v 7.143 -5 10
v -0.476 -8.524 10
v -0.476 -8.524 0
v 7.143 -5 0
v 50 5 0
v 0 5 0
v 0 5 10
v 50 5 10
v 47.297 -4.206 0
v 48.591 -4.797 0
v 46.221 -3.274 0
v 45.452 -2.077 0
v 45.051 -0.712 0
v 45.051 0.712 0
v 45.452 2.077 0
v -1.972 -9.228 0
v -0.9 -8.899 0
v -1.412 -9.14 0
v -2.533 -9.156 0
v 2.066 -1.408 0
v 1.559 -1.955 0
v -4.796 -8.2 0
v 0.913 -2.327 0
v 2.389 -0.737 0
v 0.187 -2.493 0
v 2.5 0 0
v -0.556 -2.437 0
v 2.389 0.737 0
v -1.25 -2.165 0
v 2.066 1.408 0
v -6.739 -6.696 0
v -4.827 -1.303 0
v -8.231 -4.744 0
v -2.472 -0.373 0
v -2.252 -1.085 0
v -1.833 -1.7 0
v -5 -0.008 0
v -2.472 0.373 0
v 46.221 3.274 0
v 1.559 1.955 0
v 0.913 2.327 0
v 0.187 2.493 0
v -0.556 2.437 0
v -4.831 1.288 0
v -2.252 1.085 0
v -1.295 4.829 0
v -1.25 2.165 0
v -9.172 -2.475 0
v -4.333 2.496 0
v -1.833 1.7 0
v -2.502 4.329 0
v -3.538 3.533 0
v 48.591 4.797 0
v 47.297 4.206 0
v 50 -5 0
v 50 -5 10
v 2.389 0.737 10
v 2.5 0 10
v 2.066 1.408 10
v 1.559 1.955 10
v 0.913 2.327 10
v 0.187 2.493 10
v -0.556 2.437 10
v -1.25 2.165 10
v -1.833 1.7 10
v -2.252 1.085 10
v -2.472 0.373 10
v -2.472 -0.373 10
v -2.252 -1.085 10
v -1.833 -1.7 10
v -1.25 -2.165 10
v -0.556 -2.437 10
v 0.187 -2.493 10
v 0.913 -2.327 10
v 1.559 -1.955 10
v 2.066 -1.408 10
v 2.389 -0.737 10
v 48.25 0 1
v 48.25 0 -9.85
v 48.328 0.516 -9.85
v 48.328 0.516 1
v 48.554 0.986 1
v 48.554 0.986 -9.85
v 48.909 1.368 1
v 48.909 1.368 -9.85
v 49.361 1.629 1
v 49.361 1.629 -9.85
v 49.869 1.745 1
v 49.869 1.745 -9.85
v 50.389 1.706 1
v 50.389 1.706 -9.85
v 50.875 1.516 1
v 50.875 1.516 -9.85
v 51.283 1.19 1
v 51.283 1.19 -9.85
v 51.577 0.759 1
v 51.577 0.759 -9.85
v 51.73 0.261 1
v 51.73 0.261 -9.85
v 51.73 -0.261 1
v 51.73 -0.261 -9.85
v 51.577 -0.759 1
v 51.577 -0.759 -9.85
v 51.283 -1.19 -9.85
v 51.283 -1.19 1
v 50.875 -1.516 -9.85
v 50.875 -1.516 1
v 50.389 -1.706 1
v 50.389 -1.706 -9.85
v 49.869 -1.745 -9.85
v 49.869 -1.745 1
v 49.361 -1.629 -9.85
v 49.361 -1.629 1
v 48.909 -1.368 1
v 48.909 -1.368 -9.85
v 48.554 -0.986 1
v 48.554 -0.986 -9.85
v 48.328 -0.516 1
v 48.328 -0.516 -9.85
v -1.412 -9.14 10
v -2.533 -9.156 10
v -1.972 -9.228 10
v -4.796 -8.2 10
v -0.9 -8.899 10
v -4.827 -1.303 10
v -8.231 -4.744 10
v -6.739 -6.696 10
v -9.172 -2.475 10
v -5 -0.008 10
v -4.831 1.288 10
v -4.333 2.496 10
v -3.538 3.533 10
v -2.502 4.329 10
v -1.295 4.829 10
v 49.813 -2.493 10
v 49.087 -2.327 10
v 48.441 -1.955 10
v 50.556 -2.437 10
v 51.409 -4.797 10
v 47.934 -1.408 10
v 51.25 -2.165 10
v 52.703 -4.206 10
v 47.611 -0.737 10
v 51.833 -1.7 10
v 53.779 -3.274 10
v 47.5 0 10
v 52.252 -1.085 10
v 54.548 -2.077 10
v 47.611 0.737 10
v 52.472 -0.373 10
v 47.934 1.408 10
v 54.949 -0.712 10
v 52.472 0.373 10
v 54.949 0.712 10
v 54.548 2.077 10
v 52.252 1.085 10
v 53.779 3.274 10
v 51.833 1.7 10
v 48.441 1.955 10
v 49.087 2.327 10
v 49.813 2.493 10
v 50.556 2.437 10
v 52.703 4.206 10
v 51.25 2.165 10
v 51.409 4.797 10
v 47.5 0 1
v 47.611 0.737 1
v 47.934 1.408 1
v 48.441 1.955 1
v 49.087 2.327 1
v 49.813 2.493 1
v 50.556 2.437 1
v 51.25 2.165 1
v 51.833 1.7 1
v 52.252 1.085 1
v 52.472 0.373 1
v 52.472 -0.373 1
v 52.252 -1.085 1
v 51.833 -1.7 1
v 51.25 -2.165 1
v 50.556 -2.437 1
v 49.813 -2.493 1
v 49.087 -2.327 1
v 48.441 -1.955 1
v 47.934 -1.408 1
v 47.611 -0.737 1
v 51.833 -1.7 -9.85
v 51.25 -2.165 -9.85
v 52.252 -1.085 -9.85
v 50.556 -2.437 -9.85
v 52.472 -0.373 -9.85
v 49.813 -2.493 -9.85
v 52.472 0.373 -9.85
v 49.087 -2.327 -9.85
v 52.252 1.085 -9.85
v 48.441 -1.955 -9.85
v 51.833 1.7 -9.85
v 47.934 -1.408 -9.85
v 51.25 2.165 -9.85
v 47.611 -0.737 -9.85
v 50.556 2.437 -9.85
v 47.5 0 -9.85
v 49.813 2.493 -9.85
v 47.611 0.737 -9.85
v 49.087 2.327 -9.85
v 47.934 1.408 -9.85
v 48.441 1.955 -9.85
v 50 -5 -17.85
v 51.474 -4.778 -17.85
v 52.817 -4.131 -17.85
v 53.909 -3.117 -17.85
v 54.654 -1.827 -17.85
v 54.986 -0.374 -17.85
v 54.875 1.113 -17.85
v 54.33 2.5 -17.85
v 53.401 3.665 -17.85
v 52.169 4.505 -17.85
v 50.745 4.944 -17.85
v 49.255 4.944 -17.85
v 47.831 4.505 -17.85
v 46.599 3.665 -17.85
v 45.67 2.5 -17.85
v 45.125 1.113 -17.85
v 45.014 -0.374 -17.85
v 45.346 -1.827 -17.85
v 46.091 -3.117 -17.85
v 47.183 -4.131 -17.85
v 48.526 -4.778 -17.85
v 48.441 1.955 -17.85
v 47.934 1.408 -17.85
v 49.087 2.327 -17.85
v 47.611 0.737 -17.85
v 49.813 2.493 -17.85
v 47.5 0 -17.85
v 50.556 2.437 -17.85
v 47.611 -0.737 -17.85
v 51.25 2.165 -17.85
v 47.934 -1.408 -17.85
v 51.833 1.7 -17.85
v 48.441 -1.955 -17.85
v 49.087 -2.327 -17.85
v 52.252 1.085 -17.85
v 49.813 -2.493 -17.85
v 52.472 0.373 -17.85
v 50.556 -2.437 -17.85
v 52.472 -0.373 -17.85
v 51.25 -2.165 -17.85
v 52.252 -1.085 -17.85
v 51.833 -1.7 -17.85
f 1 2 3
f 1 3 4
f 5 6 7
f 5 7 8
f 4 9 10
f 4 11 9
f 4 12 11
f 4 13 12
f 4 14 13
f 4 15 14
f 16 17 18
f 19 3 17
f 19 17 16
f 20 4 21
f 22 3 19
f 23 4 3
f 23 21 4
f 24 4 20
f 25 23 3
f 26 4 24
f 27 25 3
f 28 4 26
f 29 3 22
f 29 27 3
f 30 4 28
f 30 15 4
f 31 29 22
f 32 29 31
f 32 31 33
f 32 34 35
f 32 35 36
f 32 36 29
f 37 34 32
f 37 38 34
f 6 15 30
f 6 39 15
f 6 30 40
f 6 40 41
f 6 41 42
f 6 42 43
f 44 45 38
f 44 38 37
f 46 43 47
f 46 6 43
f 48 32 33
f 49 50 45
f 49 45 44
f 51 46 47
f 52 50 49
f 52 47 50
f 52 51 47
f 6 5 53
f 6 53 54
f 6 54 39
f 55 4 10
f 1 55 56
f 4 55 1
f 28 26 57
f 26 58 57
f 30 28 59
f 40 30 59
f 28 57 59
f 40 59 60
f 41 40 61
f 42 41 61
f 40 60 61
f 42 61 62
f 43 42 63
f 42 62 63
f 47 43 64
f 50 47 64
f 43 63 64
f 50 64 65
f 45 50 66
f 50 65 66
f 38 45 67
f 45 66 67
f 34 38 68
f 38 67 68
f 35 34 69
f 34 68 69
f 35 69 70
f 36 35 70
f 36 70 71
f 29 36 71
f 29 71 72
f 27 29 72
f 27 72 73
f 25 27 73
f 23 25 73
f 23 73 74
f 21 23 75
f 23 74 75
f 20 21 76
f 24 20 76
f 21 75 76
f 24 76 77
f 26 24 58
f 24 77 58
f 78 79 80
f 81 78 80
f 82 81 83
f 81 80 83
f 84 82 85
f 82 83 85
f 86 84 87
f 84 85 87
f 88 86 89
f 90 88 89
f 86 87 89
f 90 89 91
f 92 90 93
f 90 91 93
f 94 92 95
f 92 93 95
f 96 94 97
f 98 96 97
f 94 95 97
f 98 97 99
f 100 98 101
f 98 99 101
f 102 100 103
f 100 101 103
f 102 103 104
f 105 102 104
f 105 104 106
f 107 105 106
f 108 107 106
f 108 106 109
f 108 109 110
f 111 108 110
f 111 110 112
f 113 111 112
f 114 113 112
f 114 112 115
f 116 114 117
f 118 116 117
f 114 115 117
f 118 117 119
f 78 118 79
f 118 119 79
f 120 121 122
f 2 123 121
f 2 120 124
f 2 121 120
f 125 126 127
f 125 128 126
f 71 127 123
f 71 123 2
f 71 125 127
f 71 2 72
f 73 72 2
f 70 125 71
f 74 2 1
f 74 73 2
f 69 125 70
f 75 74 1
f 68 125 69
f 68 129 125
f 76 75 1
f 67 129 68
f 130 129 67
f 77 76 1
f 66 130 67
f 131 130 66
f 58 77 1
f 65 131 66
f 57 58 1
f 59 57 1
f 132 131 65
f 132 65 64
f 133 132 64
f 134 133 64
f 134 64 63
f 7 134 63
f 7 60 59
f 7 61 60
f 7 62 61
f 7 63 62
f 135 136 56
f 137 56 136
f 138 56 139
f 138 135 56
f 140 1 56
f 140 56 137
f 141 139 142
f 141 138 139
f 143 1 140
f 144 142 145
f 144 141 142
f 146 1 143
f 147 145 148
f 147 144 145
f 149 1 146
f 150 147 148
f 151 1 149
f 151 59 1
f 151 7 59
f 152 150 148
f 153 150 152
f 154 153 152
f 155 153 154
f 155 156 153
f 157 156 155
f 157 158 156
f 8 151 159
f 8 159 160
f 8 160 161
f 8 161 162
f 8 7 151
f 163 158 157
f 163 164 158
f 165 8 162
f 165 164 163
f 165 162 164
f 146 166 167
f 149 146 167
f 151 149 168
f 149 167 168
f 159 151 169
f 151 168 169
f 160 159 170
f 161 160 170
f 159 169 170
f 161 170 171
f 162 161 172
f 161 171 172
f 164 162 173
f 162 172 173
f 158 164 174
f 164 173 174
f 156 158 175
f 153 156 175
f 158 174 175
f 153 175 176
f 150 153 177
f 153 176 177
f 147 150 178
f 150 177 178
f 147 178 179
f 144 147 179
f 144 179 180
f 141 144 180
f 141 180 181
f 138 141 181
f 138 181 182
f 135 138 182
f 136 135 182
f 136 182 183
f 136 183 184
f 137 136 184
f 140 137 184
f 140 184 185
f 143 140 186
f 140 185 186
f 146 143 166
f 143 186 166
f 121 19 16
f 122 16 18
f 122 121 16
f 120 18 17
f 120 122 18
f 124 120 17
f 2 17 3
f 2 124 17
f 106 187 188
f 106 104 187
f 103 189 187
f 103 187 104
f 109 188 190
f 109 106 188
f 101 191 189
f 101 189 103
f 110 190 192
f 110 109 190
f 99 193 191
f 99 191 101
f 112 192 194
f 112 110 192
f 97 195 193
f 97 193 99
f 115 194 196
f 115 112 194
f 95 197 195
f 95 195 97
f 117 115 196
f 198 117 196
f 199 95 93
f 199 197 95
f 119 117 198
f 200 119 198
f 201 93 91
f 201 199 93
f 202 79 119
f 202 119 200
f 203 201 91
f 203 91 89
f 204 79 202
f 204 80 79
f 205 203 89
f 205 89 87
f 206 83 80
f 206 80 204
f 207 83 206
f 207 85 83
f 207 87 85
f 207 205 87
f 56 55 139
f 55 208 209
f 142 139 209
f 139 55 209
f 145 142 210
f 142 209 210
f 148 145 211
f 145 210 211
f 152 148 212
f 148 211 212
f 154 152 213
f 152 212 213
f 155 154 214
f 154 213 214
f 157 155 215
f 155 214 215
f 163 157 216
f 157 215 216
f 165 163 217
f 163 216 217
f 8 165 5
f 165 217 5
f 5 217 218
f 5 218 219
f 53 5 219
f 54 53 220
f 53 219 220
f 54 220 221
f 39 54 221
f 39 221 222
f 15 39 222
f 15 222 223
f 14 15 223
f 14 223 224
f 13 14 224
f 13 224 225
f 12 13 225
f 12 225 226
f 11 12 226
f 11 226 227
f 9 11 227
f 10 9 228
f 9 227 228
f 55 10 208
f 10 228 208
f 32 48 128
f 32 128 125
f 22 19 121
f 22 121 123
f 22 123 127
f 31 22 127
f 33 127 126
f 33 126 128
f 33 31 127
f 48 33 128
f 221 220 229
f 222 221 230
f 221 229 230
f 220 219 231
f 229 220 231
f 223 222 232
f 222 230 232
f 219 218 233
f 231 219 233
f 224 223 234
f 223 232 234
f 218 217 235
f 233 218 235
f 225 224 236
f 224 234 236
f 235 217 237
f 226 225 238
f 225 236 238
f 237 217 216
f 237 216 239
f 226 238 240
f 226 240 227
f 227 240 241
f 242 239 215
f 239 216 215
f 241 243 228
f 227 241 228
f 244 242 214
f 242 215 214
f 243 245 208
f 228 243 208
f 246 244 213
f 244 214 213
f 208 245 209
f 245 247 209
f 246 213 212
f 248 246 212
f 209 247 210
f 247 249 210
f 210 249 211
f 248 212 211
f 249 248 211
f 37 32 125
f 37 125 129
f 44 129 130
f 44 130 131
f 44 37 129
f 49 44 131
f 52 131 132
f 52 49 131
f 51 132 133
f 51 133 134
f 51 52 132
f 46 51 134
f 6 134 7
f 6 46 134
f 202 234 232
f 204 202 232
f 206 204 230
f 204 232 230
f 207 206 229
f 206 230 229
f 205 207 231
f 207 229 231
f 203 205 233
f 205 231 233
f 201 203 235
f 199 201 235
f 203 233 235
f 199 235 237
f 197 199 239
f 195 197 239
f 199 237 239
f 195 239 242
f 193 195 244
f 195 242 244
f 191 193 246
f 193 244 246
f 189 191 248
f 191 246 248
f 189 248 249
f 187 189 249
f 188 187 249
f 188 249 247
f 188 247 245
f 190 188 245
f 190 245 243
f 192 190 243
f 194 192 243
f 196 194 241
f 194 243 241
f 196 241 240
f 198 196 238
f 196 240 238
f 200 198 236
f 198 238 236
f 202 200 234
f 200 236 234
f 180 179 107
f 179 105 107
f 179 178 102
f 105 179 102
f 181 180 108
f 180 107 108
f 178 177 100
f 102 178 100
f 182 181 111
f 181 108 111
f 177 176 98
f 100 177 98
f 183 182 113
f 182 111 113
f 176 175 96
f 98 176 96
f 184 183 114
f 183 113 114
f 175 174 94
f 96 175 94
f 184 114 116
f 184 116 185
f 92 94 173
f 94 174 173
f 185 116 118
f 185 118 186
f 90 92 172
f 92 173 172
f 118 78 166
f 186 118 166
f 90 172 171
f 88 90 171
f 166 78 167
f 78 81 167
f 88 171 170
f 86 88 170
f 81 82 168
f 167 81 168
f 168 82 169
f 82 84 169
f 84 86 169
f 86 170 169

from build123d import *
from build123d.topology import SkipClean

# Parameters (mm, degrees)
EXTRUDE_1_DEPTH     = 10
SKETCH_2_R          = 2.500000000000002
SKETCH_2_R_2        = 2.5
CUT_EXTRUDE_1_DEPTH = 10
EXTRUDE_START       = -27.850000000000005
SKETCH_4_R          = 4.999999999999997
EXTRUDE_2_DEPTH     = 27.850000000000005
EXTRUDE_START_2     = -10
EXTRUDE_3_DEPTH     = 10
FILLET_1_R          = 2
CHAMFER_START       = 4
CHAMFER_1_OUTLINE_W = 8.394855713999998
CHAMFER_1_OUTLINE_H = 10
CHAMFER_1_DEPTH     = 3.536622653
SKETCH_6_R          = 2.500000000000002
CUT_EXTRUDE_2_DEPTH = 8
SKETCH_8_R          = 1.7500000000000036
CUT_EXTRUDE_4_DEPTH = 10.85
SKETCH_9_R          = 2.500000000000002
CUT_EXTRUDE_5_DEPTH = 9
CUT_EXTRUDE_START   = -3
CUT_EXTRUDE_6_DEPTH = 4
FILLET_2_R          = 1
EXTRUDE_START_3     = 4
EXTRUDE_4_DEPTH     = 4
SKETCH_12_R         = 2.5
EXTRUDE_5_DEPTH     = 4


with BuildPart() as part:
    # 草图1 → 凸台-拉伸1 (new body)
    with BuildSketch(Plane.XY):
        with BuildLine():
            Line((0, 5), (50, 5.000000000000001))
            ThreePointArc((50, 5.000000000000001), (55, 0), (50, -4.999999999999997))
            Line((50, -4.999999999999997), (0, -5))
            ThreePointArc((0, -5), (-5, 6.1e-16), (0, 5))
        make_face()
    extrude(amount=EXTRUDE_1_DEPTH)

    # 草图2 → 切除-拉伸1 (cut)
    with BuildSketch(Plane.XY.offset(10)):
        with Locations((50, 0)):
            Circle(SKETCH_2_R)
        Circle(SKETCH_2_R_2)
    extrude(amount=-CUT_EXTRUDE_1_DEPTH, mode=Mode.SUBTRACT)

    # 草图4 → 凸台-拉伸2 (add)
    with SkipClean():  # the faces are left unmerged after this step: merging them gives an invalid solid
        with BuildSketch(Plane.XY.offset(10).offset(EXTRUDE_START)):
            with Locations(Location((50, 0, 0), (0, 0, 270))):
                Circle(SKETCH_4_R)
        extrude(amount=EXTRUDE_2_DEPTH)

    # 草图5 → 凸台-拉伸3 (add)
    with SkipClean():  # the faces are left unmerged after this step: merging them gives an invalid solid
        with BuildSketch(Plane.XY.offset(10).offset(EXTRUDE_START_2)):
            with BuildLine():
                Line((-9.171946933133274, -2.4749524148530857), (-4.827340491122777, -1.3026065341332034))
                ThreePointArc((-4.827340491122777, -1.3026065341332034), (-3.0403097974823012, -3.9694478627805583), (5.411e-14, -5))
                Line((5.411e-14, -5), (1.028e-13, -9.5))
                ThreePointArc((1.028e-13, -9.5), (-5.7765886152163715, -7.541950939283059), (-9.171946933133274, -2.4749524148530857))
            make_face()
        extrude(amount=EXTRUDE_3_DEPTH)

    # 圆角1
    fillet_1_edges = [part.edges().sort_by_distance(p)[0] for p in [
        (1.028e-13, -9.5, 5),
    ]]
    fillet(fillet_1_edges, radius=FILLET_1_R)

    # 倒角1: read off the stored shape, not the designer's step
    # 倒角1 outline → 倒角1 (add)
    with BuildSketch(Plane(origin=(0, 0, 0), x_dir=(0.9076430982816491, 0.41974278569343915, 0), z_dir=(0.41974278569343915, -0.9076430982816494, 0)).offset(CHAMFER_START)):
        with Locations((0.18755170199999993, 5)):
            Rectangle(CHAMFER_1_OUTLINE_W, CHAMFER_1_OUTLINE_H)
    extrude(amount=CHAMFER_1_DEPTH)

    # 草图6 → 切除-拉伸2 (cut)
    with BuildSketch(Plane(origin=(0, 0, -17.850000000000005), x_dir=(-1, 0, 0), z_dir=(0, 0, -1))):
        with Locations((-50, 0)):
            Circle(SKETCH_6_R)
    extrude(amount=-CUT_EXTRUDE_2_DEPTH, mode=Mode.SUBTRACT)

    # 草图8 → 切除-拉伸4 (cut)
    with BuildSketch(Plane(origin=(0, 0, -9.850000000000005), x_dir=(-1, 0, 0), z_dir=(0, 0, -1))):
        with Locations((-50, 0)):
            Circle(SKETCH_8_R)
    extrude(amount=-CUT_EXTRUDE_4_DEPTH, mode=Mode.SUBTRACT)

    # 草图9 → 切除-拉伸5 (cut)
    with BuildSketch(Plane(origin=(0, 0, 1.0000000000000009), x_dir=(-1, 0, 0), z_dir=(0, 0, -1))):
        with Locations((-50, 0)):
            Circle(SKETCH_9_R)
    extrude(amount=-CUT_EXTRUDE_5_DEPTH, mode=Mode.SUBTRACT)

    # 草图10 → 切除-拉伸6 (cut)
    with BuildSketch(Plane(origin=(0, 0, 0), x_dir=(-1, 0, 0), z_dir=(0, 0, -1)).offset(CUT_EXTRUDE_START)):
        with BuildLine():
            Line((3.5355339059327444, -3.535533905932731), (6.717514421272216, -6.717514421272188))
            ThreePointArc((6.717514421272216, -6.717514421272188), (8.223051661510107, -4.757249349375738), (9.171946933133274, -2.474952414853084))
            Line((9.171946933133274, -2.474952414853084), (4.827340491122777, -1.3026065341332023))
            ThreePointArc((4.827340491122777, -1.3026065341332023), (-4.327921927110582, 2.503815447039863), (3.5355339059327444, -3.535533905932731))
        make_face()
    extrude(amount=-CUT_EXTRUDE_6_DEPTH, mode=Mode.SUBTRACT)

    # 圆角2
    fillet_2_edges = [part.edges().sort_by_distance(p)[0] for p in [
        (-3.1e-16, 5, 5),
    ]]
    fillet(fillet_2_edges, radius=FILLET_2_R)

    # 草图11 → 凸台-拉伸4 (add)
    with BuildSketch(Plane(origin=(0, 0, 7), x_dir=(-1, 0, 0), z_dir=(0, 0, -1)).offset(EXTRUDE_START_3)):
        with BuildLine():
            Line((8.197358015291606, -4.801387462925119), (3.5463669464222503, -3.5463669464222334))
            Line((3.5463669464222494, -3.5463669464222356), (6.717514421272216, -6.717514421272188))
            ThreePointArc((6.717514421272217, -6.71751442127219), (7.518725994466674, -5.8067856357998195), (8.197358015291606, -4.801387462925119))
        make_face()
    extrude(amount=-EXTRUDE_4_DEPTH)

    # 草图12 → 凸台-拉伸5 (add)
    with BuildSketch(Plane(origin=(0, 0, 7), x_dir=(-1, 0, 0), z_dir=(0, 0, -1)).offset(EXTRUDE_START_3)):
        with BuildLine():
            Line((3.546366946422246, -3.546366946422232), (8.197358015291606, -4.80138746292512))
            ThreePointArc((8.197358015291606, -4.80138746292512), (8.762206548927544, -3.6706588501155046), (9.171946933133276, -2.474952414853084))
            Line((9.171946933133276, -2.474952414853084), (4.827340491122777, -1.3026065341332018))
            ThreePointArc((4.827340491122777, -1.3026065341332018), (3.9694478627805414, 3.040309797482321), (3.1e-16, 5))
            Line((3.1e-16, 5), (-4.47213595499958, 5))
            ThreePointArc((-4.47213595499958, 5), (-3.5592650258243026, 4.408248290463862), (-3.7267799624996503, 3.333333333333333))
            ThreePointArc((-3.7267799624996503, 3.333333333333333), (-3.4357645511885355, -3.6325641011269494), (3.535533905932743, -3.5355339059327324))
            Line((3.535533905932743, -3.5355339059327324), (3.546366946422246, -3.546366946422232))
        make_face()
        with Locations(Location((0, 0, 0), (0, 0, 180))):
            Circle(SKETCH_12_R, mode=Mode.SUBTRACT)
    extrude(amount=-EXTRUDE_5_DEPTH)


solid = part.part
